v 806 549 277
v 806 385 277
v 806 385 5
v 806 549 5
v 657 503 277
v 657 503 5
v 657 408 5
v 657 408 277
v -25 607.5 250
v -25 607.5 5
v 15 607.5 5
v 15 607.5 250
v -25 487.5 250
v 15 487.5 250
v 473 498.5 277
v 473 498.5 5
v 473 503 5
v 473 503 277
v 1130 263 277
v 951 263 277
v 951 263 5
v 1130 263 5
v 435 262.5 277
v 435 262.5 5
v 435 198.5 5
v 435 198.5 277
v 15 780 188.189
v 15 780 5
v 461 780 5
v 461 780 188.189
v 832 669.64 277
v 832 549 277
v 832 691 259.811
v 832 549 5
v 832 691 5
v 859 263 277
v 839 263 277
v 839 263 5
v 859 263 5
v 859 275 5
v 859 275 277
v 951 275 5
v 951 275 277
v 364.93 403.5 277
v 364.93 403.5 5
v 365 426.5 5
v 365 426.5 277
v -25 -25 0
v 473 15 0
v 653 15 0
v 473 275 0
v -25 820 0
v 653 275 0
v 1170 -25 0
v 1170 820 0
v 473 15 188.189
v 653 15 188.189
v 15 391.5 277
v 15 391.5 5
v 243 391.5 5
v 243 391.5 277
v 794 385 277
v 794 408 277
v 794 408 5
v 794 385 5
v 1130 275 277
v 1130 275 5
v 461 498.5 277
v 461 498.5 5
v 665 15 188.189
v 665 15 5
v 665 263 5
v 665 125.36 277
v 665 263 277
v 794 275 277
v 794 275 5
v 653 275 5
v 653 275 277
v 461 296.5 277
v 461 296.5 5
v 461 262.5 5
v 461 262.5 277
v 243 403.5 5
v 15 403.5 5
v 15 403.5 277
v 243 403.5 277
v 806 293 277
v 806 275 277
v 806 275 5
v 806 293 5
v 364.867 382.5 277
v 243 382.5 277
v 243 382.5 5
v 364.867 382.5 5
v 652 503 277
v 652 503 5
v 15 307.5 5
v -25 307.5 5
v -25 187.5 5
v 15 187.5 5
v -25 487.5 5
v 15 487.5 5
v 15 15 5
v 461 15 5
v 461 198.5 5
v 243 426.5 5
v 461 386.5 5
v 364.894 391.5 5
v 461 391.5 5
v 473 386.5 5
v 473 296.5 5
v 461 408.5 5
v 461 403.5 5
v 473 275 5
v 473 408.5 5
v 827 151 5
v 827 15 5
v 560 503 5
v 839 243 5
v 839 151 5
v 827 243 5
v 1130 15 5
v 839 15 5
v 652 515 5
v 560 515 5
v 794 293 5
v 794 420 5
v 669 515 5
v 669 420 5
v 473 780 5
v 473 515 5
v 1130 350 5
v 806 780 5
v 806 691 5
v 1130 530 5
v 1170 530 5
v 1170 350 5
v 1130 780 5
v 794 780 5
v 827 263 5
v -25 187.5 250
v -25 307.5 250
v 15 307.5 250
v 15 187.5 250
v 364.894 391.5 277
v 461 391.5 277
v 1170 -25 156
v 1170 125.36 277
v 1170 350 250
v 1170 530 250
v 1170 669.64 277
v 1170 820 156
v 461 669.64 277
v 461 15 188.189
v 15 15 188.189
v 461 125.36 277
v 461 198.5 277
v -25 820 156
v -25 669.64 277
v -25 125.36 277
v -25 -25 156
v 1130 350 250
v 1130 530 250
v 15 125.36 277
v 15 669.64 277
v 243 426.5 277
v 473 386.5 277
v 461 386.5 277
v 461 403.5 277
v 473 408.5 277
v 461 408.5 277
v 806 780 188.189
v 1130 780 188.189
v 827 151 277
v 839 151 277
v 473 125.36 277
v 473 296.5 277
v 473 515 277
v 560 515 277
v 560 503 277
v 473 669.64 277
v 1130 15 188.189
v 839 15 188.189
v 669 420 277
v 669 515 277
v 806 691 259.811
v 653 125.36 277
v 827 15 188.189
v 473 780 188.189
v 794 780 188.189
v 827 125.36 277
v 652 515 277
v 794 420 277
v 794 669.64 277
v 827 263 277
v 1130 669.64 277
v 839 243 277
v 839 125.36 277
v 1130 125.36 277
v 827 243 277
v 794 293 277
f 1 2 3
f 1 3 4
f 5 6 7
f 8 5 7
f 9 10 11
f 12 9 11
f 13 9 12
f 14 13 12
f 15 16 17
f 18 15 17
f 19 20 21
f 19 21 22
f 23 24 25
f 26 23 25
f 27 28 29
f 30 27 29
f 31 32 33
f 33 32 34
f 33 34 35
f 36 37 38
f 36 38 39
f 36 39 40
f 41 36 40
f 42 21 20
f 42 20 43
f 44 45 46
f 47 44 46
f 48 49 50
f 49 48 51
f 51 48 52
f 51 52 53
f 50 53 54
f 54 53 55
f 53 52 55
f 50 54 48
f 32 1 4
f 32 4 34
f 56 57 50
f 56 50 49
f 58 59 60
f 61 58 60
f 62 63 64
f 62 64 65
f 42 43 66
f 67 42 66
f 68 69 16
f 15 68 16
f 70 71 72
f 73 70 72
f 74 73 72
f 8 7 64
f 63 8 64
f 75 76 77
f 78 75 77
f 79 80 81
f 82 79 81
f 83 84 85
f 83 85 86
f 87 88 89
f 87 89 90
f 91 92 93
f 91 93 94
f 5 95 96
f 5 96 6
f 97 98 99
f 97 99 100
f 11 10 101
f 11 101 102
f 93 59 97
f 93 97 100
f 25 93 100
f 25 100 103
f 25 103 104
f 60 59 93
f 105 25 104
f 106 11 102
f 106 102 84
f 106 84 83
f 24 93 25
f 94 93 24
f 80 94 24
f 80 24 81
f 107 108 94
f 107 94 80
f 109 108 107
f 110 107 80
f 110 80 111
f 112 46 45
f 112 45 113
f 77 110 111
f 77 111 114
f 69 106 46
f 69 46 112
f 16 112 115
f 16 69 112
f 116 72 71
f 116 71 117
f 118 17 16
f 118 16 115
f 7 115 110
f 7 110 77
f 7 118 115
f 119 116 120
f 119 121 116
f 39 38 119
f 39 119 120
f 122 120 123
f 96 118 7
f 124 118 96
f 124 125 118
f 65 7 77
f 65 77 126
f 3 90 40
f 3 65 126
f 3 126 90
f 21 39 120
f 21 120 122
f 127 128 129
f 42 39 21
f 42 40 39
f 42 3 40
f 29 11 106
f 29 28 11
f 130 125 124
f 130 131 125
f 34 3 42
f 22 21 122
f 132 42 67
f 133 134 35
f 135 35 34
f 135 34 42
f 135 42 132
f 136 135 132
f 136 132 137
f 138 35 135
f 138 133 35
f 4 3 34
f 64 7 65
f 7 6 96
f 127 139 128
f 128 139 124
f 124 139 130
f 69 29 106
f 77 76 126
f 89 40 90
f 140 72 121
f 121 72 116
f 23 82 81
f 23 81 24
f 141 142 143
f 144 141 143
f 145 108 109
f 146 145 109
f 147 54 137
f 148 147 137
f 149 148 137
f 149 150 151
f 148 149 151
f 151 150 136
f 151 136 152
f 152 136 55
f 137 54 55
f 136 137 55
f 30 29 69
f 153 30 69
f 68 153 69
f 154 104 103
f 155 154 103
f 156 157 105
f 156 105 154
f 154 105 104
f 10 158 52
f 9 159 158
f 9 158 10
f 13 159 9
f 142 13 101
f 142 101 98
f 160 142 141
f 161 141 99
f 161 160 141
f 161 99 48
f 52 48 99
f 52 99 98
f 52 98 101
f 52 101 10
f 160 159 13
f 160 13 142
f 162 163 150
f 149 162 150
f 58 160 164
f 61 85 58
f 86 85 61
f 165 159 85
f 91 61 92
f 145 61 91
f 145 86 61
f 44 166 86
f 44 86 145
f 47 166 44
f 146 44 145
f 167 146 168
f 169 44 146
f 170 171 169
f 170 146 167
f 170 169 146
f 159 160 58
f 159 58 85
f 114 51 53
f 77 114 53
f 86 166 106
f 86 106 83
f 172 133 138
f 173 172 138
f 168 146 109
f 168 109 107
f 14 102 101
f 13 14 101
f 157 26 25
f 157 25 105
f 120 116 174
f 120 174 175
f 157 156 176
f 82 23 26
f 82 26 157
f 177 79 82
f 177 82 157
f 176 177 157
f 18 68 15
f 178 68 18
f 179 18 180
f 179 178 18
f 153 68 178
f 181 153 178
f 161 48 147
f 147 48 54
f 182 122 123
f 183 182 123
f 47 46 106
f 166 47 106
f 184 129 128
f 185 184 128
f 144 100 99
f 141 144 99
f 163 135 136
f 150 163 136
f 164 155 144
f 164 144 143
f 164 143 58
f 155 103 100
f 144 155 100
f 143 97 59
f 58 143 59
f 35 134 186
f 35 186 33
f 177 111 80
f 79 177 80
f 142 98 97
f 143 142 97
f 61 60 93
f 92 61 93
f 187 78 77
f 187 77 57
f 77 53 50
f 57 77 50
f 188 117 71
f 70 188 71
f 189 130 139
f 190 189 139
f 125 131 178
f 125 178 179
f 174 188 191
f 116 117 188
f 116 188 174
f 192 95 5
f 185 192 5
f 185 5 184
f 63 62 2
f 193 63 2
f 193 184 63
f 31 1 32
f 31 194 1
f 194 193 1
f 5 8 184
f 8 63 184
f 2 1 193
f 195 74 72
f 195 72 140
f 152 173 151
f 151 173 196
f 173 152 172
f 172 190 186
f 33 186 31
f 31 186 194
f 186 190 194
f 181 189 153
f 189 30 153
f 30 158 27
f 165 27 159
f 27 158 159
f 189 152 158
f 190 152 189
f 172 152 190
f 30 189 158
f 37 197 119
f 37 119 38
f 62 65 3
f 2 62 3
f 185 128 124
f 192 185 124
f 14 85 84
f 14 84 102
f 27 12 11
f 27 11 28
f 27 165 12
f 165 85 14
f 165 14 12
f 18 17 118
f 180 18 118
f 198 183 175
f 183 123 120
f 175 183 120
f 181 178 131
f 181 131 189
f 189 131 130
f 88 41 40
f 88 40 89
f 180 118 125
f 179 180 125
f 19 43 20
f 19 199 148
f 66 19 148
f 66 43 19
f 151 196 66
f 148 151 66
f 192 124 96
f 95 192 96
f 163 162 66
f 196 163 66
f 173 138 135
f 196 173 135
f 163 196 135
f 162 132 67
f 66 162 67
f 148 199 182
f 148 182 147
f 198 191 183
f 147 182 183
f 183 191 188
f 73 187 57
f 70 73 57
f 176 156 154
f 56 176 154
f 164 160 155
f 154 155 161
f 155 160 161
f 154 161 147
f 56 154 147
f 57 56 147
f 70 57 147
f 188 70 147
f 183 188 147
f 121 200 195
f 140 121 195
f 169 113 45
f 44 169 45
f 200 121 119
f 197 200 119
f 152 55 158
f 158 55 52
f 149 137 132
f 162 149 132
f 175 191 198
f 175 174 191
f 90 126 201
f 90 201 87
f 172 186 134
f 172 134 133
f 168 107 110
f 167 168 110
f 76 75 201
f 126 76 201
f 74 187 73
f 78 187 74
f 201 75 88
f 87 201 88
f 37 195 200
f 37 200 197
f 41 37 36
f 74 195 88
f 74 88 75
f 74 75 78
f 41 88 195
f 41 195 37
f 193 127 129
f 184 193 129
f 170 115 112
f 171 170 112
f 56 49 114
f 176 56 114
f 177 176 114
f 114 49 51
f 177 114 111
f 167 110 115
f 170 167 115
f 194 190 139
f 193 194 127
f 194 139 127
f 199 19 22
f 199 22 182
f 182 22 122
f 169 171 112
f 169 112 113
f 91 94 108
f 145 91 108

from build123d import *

# Parameters (mm, degrees)
F0_W     = 179
F0_H     = 12
F0_W_2   = 138
F0_H_2   = 40
F0_W_3   = 40
F0_H_3   = 120
F0_W_4   = 92
F0_W_5   = 12
F0_H_4   = 90
F0_H_5   = 180
F0_W_6   = 87
F0_H_6   = 92
F0_W_7   = 26
F0_H_7   = 142
F0_H_8   = 136
F0_W_8   = 228
F0_H_9   = 18
F0_H_10  = 20
F0_W_9   = 20
F1_DEPTH = 5
F2_DEPTH = 277
F3_W     = 40
F3_H     = 120
F3_H_2   = 180
F4_DEPTH = 27
F6_DEPTH = 1195.001


with BuildPart() as f1:
    # F0 (on Top) → F1 (new body)
    with BuildSketch(Plane.XY):
        with Locations((1040.5, 269)):
            Rectangle(F0_W, F0_H)
        Polygon((794, 408), (794, 420), (669, 420), (669, 515), (652, 515), (652, 503), (657, 503), (657, 408), align=None)
        with Locations((392, -5)):
            Rectangle(F0_W_2, F0_H_2)
        Polygon((1130, 350), (1130, 530), (1130, 780), (806, 780), (806, 691), (832, 691), (832, 549), (806, 549), (806, 385), (806, 293), (806, 275), (839, 275), (859, 275), (951, 275), (1130, 275), align=None)
        with Locations((-5, 547.5)):
            Rectangle(F0_W_3, F0_H_3)
        with Locations((-5, 247.5)):
            Rectangle(F0_W_3, F0_H_3)
        Polygon((15, 487.5), (-25, 487.5), (-25, 307.5), (15, 307.5), (15, 382.1609020233), (15, 391.5), (15, 403.5), align=None)
        Polygon((15, 187.5), (-25, 187.5), (-25, -25), (323, -25), (323, 15), (15, 15), align=None)
        Polygon((1130, 15), (1130, 263), (951, 263), (859, 263), (839, 263), (839, 243), (839, 151), (839, 15), align=None)
        with Locations((905, 269)):
            Rectangle(F0_W_4, F0_H)
        Polygon((364.8940163038, 391.5), (243, 391.5), (243, 382.5), (364.8667633533, 382.5), align=None)
        Polygon((473, 780), (461, 780), (461, 498.5), (473, 498.5), (473, 503), (473, 515), align=None)
        with Locations((467, 453.5)):
            Rectangle(F0_W_5, F0_H_4)
        Polygon((243, 426.5), (243, 403.5), (364.9303535711, 403.5), (365, 426.5), align=None)
        Polygon((473, 503), (473, 498.5), (473, 408.5), (473, 386.5), (473, 296.5), (473, 275), (653, 275), (670, 275), (794, 275), (794, 293), (794, 385), (794, 408), (657, 408), (657, 503), (652, 503), (560, 503), align=None)
        with Locations((1150, 440)):
            Rectangle(F0_W_3, F0_H_5)
        Polygon((665, 263), (665, 15), (827, 15), (827, 151), (827, 243), (827, 263), (806, 263), (794, 263), align=None)
        with Locations((516.5, 509)):
            Rectangle(F0_W_6, F0_H)
        with Locations((467, 341.5)):
            Rectangle(F0_W_5, F0_H_4)
        Polygon((15, 382.1609020233), (15, 307.5), (15, 187.5), (15, 15), (323, 15), (461, 15), (461, 198.5), (435, 198.5), (435, 262.5), (461, 262.5), (461, 296.5), (461, 386.5), (461, 391.5), (365, 391.5), (364.8940163038, 391.5), (364.8667633533, 382.5), (243, 382.5), (243, 391.5), (15, 391.5), align=None)
        Polygon((1170, 530), (1170, 820), (-25, 820), (-25, 607.5), (15, 607.5), (15, 780), (461, 780), (473, 780), (794, 780), (806, 780), (1130, 780), (1130, 530), align=None)
        with Locations((833, 197)):
            Rectangle(F0_W_5, F0_H_6)
        Polygon((461, 198.5), (461, 15), (473, 15), (473, 275), (473, 296.5), (461, 296.5), (461, 262.5), (435, 262.5), (435, 198.5), align=None)
        Polygon((794, 420), (794, 780), (473, 780), (473, 515), (560, 515), (652, 515), (669, 515), (669, 420), align=None)
        with Locations((819, 620)):
            Rectangle(F0_W_7, F0_H_7)
        with Locations((606, 509)):
            Rectangle(F0_W_4, F0_H)
        with Locations((833, 83)):
            Rectangle(F0_W_5, F0_H_8)
        Polygon((653, 275), (653, 15), (665, 15), (665, 263), (794, 263), (794, 275), (670, 275), align=None)
        Polygon((1170, -25), (1170, 350), (1130, 350), (1130, 275), (1130, 263), (1130, 15), (839, 15), (827, 15), (665, 15), (653, 15), (473, 15), (461, 15), (461, -25), align=None)
        with Locations((800, 339)):
            Rectangle(F0_W_5, F0_H_6)
        with Locations((129, 397.5)):
            Rectangle(F0_W_8, F0_H)
        with Locations((800, 284)):
            Rectangle(F0_W_5, F0_H_9)
        Polygon((806, 691), (806, 780), (794, 780), (794, 420), (794, 408), (794, 385), (806, 385), (806, 549), align=None)
        with Locations((833, 253)):
            Rectangle(F0_W_5, F0_H_10)
        Polygon((839, 263), (839, 275), (806, 275), (806, 263), (827, 263), align=None)
        with Locations((849, 269)):
            Rectangle(F0_W_9, F0_H)
        Polygon((365, 403.5), (364.9303535711, 403.5), (364.8940163038, 391.5), (365, 391.5), (461, 391.5), (461, 386.5), (473, 386.5), (473, 408.5), (461, 408.5), (461, 403.5), align=None)
        Polygon((364.9303535711, 403.5), (243, 403.5), (243, 391.5), (364.8940163038, 391.5), align=None)
        with Locations((800, 269)):
            Rectangle(F0_W_5, F0_H)
        Polygon((15, 780), (15, 607.5), (15, 487.5), (15, 403.5), (243, 403.5), (243, 426.5), (365, 426.5), (364.9303535711, 403.5), (365, 403.5), (461, 403.5), (461, 408.5), (461, 498.5), (461, 780), align=None)
    extrude(amount=F1_DEPTH)

    # F0 (on Top) → F2 (join)
    with BuildSketch(Plane.XY):
        Polygon((15, 187.5), (-25, 187.5), (-25, -25), (323, -25), (323, 15), (15, 15), align=None)
        with Locations((392, -5)):
            Rectangle(F0_W_2, F0_H_2)
        Polygon((1170, -25), (1170, 350), (1130, 350), (1130, 275), (1130, 263), (1130, 15), (839, 15), (827, 15), (665, 15), (653, 15), (473, 15), (461, 15), (461, -25), align=None)
        with Locations((833, 83)):
            Rectangle(F0_W_5, F0_H_8)
        Polygon((653, 275), (653, 15), (665, 15), (665, 263), (794, 263), (794, 275), (670, 275), align=None)
        Polygon((461, 198.5), (461, 15), (473, 15), (473, 275), (473, 296.5), (461, 296.5), (461, 262.5), (435, 262.5), (435, 198.5), align=None)
        Polygon((15, 487.5), (-25, 487.5), (-25, 307.5), (15, 307.5), (15, 382.1609020233), (15, 391.5), (15, 403.5), align=None)
        with Locations((129, 397.5)):
            Rectangle(F0_W_8, F0_H)
        Polygon((243, 426.5), (243, 403.5), (364.9303535711, 403.5), (365, 426.5), align=None)
        Polygon((364.9303535711, 403.5), (243, 403.5), (243, 391.5), (364.8940163038, 391.5), align=None)
        Polygon((364.8940163038, 391.5), (243, 391.5), (243, 382.5), (364.8667633533, 382.5), align=None)
        Polygon((365, 403.5), (364.9303535711, 403.5), (364.8940163038, 391.5), (365, 391.5), (461, 391.5), (461, 386.5), (473, 386.5), (473, 408.5), (461, 408.5), (461, 403.5), align=None)
        Polygon((473, 780), (461, 780), (461, 498.5), (473, 498.5), (473, 503), (473, 515), align=None)
        with Locations((516.5, 509)):
            Rectangle(F0_W_6, F0_H)
        Polygon((794, 408), (794, 420), (669, 420), (669, 515), (652, 515), (652, 503), (657, 503), (657, 408), align=None)
        Polygon((806, 691), (806, 780), (794, 780), (794, 420), (794, 408), (794, 385), (806, 385), (806, 549), align=None)
        with Locations((833, 253)):
            Rectangle(F0_W_5, F0_H_10)
        with Locations((849, 269)):
            Rectangle(F0_W_9, F0_H)
        Polygon((839, 263), (839, 275), (806, 275), (806, 263), (827, 263), align=None)
        with Locations((800, 269)):
            Rectangle(F0_W_5, F0_H)
        with Locations((800, 284)):
            Rectangle(F0_W_5, F0_H_9)
        with Locations((1040.5, 269)):
            Rectangle(F0_W, F0_H)
        Polygon((1170, 530), (1170, 820), (-25, 820), (-25, 607.5), (15, 607.5), (15, 780), (461, 780), (473, 780), (794, 780), (806, 780), (1130, 780), (1130, 530), align=None)
        with Locations((819, 620)):
            Rectangle(F0_W_7, F0_H_7)
    extrude(amount=F2_DEPTH)

    # F3 (on face) → F4 (join)
    with BuildSketch(Plane.XY.offset(277)):
        with Locations((-5, 547.5)):
            Rectangle(F3_W, F3_H)
        with Locations((-5, 397.5)):
            Rectangle(F3_W, F3_H_2)
        with Locations((-5, 247.5)):
            Rectangle(F3_W, F3_H)
        with Locations((1150, 440)):
            Rectangle(F3_W, F3_H_2)
    extrude(amount=-F4_DEPTH)

    # F5 (on face) → F6 (cut, through all)
    with BuildSketch(Plane(origin=(-25, 0, 0), x_dir=(0, -1, 0), z_dir=(-1, 0, 0))):
        Polygon((-669.6397058824, 277), (-397.5, 496), (-820, 496), (-820, 277), align=None)
        Polygon((-820, 156), (-669.6397058824, 277), (-820, 277), align=None)
        Polygon((25, 496), (-397.5, 496), (-125.3602941176, 277), (25, 277), align=None)
        Polygon((25, 277), (-125.3602941176, 277), (25, 156), align=None)
    extrude(amount=-F6_DEPTH, mode=Mode.SUBTRACT)


solid = f1.part
